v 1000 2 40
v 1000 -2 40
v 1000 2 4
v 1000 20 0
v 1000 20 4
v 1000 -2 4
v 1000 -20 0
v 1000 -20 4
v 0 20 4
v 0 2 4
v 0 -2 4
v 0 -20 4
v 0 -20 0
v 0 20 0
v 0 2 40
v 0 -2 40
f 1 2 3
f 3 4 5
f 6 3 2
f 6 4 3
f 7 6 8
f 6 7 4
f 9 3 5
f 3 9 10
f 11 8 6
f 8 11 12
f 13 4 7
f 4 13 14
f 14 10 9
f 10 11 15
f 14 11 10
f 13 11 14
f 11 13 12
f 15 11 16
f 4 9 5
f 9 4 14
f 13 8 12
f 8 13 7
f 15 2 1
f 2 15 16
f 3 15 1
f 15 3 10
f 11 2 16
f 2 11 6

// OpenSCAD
// file: params_metal_profiles.scad
// F-Roof: A multi-function single-layer roof
// https://github.com/f-roof
// Author: Mihai Oltean; https://tcreate.org
//---------------------------------------------------------------------------------------
T_profile_thick = 4;
//---------------------------------------------------------------------------------------
// main file
// F-Roof: A multi-function single-layer roof
// https://github.com/f-roof
// Author: Mihai Oltean; https://tcreate.org
//---------------------------------------------------------------------------------------
include <params_metal_profiles.scad>
//---------------------------------------------------------------------------------------
module rectangular_tube(length, H, W)
{
    color("gray") 
    difference(){
        cube([W, H, length]);
        translate ([3, 3, 0] - [0,0,1]) cube([W - 6, H - 6, length] + [0, 0, 2]);
    }
}
//---------------------------------------------------------------------------------------
module T_40_4(length)
{
    translate ([0, -20, 0]){
        difference(){
        // base wall
            cube([length, 40, T_profile_thick]);
            /*
            for (k = [0 : 6]){
                translate ([k * distance_between_capriori + caprior_side_small / 2, 10, 0]) cylinder(h = T_profile_thick + 2, r = 4);
                translate ([k * distance_between_capriori + caprior_side_small / 2, 30, 0]) cylinder(h = T_profile_thick + 2, r = 4);
            }
            */
        }
        // vertical wall
        translate ([0, 20 - T_profile_thick / 2, 0]) cube([length, T_profile_thick, 40]);
    }
}
//---------------------------------------------------------------------------------------

T_40_4(1000);
